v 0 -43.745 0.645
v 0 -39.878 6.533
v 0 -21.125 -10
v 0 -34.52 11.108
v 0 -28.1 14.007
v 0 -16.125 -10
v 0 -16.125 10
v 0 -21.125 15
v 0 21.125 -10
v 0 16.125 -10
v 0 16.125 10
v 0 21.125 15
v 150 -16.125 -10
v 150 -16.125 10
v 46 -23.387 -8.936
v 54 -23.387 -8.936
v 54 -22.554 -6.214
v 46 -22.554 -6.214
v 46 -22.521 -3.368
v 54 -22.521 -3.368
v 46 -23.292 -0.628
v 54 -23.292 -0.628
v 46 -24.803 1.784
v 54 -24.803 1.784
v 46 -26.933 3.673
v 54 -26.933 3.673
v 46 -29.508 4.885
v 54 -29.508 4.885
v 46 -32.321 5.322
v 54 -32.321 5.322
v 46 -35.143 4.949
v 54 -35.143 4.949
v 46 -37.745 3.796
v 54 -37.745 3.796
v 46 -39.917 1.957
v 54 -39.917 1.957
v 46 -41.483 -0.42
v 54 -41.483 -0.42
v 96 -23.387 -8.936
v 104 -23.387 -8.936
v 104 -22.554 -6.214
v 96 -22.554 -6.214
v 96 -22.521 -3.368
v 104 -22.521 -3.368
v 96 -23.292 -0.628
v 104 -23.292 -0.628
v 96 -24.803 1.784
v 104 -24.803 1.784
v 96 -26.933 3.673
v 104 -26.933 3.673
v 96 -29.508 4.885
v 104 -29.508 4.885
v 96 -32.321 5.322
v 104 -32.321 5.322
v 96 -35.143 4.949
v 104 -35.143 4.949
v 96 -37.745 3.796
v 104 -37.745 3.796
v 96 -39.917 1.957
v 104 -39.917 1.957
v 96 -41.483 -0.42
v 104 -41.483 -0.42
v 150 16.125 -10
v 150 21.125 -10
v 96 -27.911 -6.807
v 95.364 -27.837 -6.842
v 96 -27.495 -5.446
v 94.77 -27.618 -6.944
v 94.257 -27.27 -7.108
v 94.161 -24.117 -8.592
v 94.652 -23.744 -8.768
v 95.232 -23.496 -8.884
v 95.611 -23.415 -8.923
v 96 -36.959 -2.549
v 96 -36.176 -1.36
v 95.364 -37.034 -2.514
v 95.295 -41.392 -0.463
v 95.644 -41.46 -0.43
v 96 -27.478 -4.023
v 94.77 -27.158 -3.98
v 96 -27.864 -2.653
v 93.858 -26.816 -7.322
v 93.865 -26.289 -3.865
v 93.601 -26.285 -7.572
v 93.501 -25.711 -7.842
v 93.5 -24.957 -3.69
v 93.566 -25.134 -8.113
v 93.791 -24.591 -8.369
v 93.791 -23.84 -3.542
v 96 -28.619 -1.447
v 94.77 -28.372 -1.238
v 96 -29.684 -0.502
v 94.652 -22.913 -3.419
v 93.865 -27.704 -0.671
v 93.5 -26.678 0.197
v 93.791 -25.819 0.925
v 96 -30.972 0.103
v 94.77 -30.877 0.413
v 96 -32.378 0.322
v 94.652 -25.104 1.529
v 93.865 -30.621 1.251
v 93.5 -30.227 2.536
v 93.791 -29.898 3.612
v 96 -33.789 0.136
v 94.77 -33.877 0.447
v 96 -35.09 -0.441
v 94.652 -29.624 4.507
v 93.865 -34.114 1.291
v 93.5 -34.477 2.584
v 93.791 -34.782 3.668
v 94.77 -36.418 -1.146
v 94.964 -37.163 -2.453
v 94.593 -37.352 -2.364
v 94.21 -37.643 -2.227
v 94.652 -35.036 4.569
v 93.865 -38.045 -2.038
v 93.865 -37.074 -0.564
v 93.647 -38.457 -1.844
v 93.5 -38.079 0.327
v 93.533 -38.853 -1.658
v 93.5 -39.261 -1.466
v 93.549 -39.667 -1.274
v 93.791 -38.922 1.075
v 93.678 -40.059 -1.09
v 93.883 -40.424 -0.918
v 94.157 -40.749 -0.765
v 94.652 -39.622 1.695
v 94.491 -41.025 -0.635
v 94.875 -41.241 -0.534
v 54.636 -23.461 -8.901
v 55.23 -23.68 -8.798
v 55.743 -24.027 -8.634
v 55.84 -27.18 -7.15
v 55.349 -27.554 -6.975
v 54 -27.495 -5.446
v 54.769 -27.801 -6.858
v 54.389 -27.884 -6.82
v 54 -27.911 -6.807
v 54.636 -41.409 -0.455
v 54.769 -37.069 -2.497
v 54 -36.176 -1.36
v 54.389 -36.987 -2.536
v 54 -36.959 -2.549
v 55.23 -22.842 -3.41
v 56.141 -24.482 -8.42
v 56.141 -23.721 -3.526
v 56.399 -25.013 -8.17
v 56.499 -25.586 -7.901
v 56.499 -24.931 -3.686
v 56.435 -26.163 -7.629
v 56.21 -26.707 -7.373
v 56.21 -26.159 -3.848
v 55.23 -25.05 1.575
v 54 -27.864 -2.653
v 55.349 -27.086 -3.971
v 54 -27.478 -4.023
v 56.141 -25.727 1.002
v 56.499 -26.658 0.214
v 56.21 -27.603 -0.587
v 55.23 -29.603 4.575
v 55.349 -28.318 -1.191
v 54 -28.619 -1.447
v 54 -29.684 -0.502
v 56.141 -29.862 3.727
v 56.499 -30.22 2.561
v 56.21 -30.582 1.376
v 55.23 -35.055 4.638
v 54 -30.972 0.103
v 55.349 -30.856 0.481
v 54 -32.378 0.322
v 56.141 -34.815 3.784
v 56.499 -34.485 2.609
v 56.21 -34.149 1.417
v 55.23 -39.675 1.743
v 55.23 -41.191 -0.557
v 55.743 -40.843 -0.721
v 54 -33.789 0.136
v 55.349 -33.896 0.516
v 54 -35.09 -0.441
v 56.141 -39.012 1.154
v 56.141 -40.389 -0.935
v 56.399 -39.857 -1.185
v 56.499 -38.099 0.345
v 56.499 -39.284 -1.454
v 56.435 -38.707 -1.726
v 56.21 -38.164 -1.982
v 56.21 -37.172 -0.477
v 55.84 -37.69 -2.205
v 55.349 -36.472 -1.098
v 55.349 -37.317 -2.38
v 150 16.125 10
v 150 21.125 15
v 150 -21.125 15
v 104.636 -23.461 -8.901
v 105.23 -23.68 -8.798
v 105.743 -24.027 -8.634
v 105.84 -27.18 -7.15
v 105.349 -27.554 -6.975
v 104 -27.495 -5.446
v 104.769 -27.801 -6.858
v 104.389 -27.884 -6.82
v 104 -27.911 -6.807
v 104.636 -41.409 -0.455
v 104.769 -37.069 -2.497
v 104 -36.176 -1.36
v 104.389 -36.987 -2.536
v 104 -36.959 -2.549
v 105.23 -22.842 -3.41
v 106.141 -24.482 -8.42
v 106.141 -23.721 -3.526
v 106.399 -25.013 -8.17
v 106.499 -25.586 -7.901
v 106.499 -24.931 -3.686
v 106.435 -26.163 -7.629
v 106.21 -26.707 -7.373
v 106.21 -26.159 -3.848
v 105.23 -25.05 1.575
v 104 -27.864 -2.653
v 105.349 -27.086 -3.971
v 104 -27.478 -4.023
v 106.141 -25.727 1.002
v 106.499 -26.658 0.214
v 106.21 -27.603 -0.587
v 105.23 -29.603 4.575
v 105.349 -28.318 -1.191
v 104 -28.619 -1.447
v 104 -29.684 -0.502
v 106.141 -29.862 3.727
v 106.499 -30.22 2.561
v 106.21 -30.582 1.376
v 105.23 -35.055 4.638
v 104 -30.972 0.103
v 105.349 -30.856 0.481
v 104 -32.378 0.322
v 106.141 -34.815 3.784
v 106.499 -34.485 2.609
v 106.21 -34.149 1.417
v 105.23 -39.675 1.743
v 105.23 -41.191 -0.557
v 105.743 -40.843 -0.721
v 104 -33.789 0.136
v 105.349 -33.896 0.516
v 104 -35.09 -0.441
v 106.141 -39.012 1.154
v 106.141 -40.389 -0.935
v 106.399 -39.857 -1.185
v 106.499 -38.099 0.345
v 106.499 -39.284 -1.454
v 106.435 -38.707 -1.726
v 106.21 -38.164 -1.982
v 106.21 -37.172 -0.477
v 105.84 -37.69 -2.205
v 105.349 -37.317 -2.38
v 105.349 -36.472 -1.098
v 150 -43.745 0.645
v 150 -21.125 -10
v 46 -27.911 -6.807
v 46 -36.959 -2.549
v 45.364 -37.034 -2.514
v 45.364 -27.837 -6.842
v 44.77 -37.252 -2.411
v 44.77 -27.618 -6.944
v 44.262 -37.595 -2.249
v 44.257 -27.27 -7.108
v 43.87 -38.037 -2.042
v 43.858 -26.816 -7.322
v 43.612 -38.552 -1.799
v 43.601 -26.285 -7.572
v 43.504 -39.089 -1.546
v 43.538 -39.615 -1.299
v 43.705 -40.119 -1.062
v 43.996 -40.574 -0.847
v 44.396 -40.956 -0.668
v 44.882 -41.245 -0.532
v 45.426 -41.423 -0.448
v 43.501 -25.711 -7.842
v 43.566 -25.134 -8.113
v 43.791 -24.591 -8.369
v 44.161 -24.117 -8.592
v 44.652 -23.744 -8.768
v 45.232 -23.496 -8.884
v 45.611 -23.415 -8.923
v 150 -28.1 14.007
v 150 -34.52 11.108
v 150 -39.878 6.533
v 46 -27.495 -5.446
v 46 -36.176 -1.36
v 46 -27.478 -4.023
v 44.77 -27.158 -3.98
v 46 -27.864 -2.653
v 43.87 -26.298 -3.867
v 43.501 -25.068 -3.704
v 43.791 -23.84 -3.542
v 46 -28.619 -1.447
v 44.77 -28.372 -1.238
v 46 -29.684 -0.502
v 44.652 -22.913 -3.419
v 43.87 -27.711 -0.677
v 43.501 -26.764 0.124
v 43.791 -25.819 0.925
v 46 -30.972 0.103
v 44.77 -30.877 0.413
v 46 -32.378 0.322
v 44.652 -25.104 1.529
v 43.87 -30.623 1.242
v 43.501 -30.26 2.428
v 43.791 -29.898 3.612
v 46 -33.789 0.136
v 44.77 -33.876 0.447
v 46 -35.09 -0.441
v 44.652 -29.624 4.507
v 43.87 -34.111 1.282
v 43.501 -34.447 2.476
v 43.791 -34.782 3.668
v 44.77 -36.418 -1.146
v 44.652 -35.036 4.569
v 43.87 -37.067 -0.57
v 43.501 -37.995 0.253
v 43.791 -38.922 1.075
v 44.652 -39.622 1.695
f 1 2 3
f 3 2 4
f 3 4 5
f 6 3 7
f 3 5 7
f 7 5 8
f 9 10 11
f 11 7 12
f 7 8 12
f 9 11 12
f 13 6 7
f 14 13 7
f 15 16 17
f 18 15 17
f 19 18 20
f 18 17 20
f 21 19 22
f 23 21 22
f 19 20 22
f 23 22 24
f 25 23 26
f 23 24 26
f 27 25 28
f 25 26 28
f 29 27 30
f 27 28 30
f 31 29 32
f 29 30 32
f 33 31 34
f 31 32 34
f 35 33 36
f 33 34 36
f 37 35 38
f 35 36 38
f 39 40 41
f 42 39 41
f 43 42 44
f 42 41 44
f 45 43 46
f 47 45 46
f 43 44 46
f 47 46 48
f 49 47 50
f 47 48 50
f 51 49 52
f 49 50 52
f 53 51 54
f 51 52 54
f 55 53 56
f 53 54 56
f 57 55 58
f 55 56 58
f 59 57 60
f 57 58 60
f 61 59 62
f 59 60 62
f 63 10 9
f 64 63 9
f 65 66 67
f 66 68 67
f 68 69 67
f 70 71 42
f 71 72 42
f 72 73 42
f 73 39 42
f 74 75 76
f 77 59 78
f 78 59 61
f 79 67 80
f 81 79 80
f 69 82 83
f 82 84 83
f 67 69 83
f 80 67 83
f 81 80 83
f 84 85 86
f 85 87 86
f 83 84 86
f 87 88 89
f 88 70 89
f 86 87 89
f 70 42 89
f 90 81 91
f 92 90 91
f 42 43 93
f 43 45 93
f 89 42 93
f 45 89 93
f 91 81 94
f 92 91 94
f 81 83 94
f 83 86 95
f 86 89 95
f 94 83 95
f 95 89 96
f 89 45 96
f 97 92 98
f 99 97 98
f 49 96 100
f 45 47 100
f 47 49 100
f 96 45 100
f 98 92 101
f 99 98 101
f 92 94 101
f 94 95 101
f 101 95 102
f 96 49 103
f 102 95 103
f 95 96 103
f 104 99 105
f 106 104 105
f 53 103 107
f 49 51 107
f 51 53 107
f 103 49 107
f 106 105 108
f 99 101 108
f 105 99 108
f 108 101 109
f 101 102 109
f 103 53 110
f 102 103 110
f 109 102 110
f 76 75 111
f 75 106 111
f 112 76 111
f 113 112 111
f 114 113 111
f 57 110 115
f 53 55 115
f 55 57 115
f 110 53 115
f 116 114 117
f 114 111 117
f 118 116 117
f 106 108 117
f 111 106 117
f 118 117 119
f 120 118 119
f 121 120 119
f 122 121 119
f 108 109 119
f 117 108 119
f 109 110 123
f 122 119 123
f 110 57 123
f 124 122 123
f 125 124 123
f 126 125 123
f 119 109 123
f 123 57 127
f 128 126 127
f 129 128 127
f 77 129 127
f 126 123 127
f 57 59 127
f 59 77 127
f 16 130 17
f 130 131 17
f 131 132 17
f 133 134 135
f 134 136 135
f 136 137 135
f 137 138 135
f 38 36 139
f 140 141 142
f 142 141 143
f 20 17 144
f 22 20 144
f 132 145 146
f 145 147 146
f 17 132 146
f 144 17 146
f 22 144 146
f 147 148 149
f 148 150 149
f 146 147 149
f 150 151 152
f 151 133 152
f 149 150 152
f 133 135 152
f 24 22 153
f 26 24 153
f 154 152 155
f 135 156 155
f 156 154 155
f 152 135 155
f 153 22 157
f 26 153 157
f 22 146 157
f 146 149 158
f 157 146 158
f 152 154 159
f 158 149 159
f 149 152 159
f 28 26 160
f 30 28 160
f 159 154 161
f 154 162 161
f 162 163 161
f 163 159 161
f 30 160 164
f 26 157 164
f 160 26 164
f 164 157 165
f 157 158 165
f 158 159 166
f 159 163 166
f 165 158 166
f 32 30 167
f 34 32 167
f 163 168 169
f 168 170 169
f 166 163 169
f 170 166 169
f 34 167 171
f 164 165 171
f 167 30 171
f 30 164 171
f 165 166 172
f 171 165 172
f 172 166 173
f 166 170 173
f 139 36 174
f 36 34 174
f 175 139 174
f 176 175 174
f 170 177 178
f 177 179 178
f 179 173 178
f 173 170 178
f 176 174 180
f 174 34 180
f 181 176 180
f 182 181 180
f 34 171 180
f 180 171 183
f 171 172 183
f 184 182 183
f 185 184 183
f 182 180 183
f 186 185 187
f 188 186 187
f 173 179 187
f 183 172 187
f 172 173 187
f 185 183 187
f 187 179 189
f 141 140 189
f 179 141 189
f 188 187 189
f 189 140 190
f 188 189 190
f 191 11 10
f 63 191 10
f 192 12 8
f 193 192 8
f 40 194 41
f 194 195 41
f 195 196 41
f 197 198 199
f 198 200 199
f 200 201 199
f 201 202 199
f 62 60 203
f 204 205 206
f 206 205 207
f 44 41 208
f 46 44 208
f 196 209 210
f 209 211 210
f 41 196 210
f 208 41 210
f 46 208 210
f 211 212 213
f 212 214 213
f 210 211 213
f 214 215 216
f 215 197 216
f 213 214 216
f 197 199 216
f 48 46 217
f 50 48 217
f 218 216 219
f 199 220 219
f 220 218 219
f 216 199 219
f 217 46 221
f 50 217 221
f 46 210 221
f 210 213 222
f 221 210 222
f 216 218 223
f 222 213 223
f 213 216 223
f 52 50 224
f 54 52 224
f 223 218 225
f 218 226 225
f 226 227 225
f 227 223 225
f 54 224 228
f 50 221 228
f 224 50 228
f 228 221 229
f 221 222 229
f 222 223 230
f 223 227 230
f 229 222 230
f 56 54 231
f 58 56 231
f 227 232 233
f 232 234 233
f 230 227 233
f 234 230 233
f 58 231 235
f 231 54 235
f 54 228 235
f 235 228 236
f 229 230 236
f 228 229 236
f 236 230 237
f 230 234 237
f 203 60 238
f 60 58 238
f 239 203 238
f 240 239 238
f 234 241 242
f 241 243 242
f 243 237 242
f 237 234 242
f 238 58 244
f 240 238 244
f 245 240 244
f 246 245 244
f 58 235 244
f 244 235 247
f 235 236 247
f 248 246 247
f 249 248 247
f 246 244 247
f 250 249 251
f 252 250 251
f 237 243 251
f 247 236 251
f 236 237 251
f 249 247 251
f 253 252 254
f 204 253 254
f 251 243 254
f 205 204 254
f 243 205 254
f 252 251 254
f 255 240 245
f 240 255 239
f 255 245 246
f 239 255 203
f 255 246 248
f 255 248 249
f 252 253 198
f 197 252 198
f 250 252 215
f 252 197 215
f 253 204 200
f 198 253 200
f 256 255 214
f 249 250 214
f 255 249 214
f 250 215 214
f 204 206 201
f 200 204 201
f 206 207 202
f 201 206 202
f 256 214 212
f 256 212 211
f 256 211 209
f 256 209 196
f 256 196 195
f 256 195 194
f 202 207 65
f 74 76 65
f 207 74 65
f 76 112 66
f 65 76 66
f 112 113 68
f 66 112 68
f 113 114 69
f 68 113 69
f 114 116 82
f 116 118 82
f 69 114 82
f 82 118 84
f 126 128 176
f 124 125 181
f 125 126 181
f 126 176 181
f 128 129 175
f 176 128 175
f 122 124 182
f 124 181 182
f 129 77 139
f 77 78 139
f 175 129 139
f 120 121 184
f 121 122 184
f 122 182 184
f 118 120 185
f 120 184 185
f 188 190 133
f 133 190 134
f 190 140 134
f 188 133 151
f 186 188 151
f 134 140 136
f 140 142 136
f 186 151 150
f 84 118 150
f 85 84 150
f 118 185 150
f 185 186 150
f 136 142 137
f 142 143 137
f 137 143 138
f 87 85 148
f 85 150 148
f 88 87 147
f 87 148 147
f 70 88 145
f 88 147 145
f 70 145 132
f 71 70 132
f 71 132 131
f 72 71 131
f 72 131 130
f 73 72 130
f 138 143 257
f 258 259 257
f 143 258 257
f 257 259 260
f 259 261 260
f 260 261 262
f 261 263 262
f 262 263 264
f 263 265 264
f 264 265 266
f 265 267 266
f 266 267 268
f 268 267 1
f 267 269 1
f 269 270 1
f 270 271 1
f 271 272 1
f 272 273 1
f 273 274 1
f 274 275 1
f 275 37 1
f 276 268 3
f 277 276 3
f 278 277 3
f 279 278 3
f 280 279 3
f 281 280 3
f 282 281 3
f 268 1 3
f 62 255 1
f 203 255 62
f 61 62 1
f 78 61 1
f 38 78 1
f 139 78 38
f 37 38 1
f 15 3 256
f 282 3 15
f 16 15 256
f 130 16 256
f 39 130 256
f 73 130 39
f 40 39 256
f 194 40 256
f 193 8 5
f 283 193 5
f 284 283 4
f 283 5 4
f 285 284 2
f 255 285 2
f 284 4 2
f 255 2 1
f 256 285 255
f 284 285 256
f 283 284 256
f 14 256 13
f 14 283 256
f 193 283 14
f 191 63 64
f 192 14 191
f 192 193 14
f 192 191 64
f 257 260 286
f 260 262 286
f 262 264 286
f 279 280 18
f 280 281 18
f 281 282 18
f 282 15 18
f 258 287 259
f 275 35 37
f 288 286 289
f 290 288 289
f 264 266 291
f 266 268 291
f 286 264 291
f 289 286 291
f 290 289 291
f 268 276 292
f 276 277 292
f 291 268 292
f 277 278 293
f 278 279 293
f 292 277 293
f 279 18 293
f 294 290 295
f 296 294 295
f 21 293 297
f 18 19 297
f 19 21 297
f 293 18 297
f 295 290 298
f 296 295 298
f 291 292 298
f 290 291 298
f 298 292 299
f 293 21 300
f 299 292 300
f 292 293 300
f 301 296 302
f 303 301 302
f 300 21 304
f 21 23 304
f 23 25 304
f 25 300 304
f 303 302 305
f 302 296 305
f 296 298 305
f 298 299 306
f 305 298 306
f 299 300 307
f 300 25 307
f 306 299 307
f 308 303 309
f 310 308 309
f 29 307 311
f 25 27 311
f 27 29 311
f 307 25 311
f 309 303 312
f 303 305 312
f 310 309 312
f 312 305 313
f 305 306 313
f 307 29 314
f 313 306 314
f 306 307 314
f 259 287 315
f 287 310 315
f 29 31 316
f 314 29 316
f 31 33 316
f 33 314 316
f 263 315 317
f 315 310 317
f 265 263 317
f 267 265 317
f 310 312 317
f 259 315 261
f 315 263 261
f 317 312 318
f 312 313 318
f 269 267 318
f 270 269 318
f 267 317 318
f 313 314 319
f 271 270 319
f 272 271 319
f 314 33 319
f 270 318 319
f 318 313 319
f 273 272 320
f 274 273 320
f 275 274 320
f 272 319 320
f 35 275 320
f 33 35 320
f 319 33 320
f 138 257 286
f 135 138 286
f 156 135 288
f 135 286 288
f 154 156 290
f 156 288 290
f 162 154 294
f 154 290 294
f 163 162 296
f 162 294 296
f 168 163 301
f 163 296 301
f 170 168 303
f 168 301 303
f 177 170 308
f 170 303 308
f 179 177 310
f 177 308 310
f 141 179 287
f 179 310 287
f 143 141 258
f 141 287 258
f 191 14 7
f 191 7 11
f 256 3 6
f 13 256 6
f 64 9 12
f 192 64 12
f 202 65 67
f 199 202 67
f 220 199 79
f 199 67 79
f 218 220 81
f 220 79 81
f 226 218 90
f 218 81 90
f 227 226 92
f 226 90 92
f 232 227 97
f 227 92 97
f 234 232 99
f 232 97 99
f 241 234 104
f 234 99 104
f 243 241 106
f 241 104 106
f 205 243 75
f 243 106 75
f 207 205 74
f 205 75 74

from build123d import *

# Parameters (mm, degrees)
F1_DEPTH = 150


with BuildPart() as f1:
    # F0 (on Right) → F1 (new body)
    with BuildSketch(Plane.YZ):
        with BuildLine():
            Line((-43.745468, 0.644926), (-21.125, -10))
            Line((-21.125, -10), (-21.125, 15))
            ThreePointArc((-21.125, 15), (-34.520463, 11.108329), (-43.745468, 0.644926))
        make_face()
        Polygon((-16.125, -10), (-16.125, 10), (16.125, 10), (16.125, -10), (21.125, -10), (21.125, 15), (-21.125, 15), (-21.125, -10), align=None)
    extrude(amount=F1_DEPTH)

    # F2 (on face) → F3 (revolve, cut)
    with BuildSketch(Plane(origin=(0, -7.68272, -16.325779), x_dir=(1, 0, 0), z_dir=(0, -0.425797, -0.904819))):
        with BuildLine():
            Line((54, 22.356325), (46, 22.356325))
            ThreePointArc((46, 22.356325), (43.5, 19.856325), (46, 17.356325))
            Line((46, 17.356325), (54, 17.356325))
            ThreePointArc((54, 17.356325), (56.5, 19.856325), (54, 22.356325))
        make_face()
        with BuildLine():
            Line((104, 22.356325), (96, 22.356325))
            ThreePointArc((96, 22.356325), (93.5, 19.856325), (96, 17.356325))
            Line((96, 17.356325), (104, 17.356325))
            ThreePointArc((104, 17.356325), (106.5, 19.856325), (104, 22.356325))
        make_face()
    revolve(axis=Axis((75, -32.435234, -4.677537), (1, 0, 0)), mode=Mode.SUBTRACT)


solid = f1.part
